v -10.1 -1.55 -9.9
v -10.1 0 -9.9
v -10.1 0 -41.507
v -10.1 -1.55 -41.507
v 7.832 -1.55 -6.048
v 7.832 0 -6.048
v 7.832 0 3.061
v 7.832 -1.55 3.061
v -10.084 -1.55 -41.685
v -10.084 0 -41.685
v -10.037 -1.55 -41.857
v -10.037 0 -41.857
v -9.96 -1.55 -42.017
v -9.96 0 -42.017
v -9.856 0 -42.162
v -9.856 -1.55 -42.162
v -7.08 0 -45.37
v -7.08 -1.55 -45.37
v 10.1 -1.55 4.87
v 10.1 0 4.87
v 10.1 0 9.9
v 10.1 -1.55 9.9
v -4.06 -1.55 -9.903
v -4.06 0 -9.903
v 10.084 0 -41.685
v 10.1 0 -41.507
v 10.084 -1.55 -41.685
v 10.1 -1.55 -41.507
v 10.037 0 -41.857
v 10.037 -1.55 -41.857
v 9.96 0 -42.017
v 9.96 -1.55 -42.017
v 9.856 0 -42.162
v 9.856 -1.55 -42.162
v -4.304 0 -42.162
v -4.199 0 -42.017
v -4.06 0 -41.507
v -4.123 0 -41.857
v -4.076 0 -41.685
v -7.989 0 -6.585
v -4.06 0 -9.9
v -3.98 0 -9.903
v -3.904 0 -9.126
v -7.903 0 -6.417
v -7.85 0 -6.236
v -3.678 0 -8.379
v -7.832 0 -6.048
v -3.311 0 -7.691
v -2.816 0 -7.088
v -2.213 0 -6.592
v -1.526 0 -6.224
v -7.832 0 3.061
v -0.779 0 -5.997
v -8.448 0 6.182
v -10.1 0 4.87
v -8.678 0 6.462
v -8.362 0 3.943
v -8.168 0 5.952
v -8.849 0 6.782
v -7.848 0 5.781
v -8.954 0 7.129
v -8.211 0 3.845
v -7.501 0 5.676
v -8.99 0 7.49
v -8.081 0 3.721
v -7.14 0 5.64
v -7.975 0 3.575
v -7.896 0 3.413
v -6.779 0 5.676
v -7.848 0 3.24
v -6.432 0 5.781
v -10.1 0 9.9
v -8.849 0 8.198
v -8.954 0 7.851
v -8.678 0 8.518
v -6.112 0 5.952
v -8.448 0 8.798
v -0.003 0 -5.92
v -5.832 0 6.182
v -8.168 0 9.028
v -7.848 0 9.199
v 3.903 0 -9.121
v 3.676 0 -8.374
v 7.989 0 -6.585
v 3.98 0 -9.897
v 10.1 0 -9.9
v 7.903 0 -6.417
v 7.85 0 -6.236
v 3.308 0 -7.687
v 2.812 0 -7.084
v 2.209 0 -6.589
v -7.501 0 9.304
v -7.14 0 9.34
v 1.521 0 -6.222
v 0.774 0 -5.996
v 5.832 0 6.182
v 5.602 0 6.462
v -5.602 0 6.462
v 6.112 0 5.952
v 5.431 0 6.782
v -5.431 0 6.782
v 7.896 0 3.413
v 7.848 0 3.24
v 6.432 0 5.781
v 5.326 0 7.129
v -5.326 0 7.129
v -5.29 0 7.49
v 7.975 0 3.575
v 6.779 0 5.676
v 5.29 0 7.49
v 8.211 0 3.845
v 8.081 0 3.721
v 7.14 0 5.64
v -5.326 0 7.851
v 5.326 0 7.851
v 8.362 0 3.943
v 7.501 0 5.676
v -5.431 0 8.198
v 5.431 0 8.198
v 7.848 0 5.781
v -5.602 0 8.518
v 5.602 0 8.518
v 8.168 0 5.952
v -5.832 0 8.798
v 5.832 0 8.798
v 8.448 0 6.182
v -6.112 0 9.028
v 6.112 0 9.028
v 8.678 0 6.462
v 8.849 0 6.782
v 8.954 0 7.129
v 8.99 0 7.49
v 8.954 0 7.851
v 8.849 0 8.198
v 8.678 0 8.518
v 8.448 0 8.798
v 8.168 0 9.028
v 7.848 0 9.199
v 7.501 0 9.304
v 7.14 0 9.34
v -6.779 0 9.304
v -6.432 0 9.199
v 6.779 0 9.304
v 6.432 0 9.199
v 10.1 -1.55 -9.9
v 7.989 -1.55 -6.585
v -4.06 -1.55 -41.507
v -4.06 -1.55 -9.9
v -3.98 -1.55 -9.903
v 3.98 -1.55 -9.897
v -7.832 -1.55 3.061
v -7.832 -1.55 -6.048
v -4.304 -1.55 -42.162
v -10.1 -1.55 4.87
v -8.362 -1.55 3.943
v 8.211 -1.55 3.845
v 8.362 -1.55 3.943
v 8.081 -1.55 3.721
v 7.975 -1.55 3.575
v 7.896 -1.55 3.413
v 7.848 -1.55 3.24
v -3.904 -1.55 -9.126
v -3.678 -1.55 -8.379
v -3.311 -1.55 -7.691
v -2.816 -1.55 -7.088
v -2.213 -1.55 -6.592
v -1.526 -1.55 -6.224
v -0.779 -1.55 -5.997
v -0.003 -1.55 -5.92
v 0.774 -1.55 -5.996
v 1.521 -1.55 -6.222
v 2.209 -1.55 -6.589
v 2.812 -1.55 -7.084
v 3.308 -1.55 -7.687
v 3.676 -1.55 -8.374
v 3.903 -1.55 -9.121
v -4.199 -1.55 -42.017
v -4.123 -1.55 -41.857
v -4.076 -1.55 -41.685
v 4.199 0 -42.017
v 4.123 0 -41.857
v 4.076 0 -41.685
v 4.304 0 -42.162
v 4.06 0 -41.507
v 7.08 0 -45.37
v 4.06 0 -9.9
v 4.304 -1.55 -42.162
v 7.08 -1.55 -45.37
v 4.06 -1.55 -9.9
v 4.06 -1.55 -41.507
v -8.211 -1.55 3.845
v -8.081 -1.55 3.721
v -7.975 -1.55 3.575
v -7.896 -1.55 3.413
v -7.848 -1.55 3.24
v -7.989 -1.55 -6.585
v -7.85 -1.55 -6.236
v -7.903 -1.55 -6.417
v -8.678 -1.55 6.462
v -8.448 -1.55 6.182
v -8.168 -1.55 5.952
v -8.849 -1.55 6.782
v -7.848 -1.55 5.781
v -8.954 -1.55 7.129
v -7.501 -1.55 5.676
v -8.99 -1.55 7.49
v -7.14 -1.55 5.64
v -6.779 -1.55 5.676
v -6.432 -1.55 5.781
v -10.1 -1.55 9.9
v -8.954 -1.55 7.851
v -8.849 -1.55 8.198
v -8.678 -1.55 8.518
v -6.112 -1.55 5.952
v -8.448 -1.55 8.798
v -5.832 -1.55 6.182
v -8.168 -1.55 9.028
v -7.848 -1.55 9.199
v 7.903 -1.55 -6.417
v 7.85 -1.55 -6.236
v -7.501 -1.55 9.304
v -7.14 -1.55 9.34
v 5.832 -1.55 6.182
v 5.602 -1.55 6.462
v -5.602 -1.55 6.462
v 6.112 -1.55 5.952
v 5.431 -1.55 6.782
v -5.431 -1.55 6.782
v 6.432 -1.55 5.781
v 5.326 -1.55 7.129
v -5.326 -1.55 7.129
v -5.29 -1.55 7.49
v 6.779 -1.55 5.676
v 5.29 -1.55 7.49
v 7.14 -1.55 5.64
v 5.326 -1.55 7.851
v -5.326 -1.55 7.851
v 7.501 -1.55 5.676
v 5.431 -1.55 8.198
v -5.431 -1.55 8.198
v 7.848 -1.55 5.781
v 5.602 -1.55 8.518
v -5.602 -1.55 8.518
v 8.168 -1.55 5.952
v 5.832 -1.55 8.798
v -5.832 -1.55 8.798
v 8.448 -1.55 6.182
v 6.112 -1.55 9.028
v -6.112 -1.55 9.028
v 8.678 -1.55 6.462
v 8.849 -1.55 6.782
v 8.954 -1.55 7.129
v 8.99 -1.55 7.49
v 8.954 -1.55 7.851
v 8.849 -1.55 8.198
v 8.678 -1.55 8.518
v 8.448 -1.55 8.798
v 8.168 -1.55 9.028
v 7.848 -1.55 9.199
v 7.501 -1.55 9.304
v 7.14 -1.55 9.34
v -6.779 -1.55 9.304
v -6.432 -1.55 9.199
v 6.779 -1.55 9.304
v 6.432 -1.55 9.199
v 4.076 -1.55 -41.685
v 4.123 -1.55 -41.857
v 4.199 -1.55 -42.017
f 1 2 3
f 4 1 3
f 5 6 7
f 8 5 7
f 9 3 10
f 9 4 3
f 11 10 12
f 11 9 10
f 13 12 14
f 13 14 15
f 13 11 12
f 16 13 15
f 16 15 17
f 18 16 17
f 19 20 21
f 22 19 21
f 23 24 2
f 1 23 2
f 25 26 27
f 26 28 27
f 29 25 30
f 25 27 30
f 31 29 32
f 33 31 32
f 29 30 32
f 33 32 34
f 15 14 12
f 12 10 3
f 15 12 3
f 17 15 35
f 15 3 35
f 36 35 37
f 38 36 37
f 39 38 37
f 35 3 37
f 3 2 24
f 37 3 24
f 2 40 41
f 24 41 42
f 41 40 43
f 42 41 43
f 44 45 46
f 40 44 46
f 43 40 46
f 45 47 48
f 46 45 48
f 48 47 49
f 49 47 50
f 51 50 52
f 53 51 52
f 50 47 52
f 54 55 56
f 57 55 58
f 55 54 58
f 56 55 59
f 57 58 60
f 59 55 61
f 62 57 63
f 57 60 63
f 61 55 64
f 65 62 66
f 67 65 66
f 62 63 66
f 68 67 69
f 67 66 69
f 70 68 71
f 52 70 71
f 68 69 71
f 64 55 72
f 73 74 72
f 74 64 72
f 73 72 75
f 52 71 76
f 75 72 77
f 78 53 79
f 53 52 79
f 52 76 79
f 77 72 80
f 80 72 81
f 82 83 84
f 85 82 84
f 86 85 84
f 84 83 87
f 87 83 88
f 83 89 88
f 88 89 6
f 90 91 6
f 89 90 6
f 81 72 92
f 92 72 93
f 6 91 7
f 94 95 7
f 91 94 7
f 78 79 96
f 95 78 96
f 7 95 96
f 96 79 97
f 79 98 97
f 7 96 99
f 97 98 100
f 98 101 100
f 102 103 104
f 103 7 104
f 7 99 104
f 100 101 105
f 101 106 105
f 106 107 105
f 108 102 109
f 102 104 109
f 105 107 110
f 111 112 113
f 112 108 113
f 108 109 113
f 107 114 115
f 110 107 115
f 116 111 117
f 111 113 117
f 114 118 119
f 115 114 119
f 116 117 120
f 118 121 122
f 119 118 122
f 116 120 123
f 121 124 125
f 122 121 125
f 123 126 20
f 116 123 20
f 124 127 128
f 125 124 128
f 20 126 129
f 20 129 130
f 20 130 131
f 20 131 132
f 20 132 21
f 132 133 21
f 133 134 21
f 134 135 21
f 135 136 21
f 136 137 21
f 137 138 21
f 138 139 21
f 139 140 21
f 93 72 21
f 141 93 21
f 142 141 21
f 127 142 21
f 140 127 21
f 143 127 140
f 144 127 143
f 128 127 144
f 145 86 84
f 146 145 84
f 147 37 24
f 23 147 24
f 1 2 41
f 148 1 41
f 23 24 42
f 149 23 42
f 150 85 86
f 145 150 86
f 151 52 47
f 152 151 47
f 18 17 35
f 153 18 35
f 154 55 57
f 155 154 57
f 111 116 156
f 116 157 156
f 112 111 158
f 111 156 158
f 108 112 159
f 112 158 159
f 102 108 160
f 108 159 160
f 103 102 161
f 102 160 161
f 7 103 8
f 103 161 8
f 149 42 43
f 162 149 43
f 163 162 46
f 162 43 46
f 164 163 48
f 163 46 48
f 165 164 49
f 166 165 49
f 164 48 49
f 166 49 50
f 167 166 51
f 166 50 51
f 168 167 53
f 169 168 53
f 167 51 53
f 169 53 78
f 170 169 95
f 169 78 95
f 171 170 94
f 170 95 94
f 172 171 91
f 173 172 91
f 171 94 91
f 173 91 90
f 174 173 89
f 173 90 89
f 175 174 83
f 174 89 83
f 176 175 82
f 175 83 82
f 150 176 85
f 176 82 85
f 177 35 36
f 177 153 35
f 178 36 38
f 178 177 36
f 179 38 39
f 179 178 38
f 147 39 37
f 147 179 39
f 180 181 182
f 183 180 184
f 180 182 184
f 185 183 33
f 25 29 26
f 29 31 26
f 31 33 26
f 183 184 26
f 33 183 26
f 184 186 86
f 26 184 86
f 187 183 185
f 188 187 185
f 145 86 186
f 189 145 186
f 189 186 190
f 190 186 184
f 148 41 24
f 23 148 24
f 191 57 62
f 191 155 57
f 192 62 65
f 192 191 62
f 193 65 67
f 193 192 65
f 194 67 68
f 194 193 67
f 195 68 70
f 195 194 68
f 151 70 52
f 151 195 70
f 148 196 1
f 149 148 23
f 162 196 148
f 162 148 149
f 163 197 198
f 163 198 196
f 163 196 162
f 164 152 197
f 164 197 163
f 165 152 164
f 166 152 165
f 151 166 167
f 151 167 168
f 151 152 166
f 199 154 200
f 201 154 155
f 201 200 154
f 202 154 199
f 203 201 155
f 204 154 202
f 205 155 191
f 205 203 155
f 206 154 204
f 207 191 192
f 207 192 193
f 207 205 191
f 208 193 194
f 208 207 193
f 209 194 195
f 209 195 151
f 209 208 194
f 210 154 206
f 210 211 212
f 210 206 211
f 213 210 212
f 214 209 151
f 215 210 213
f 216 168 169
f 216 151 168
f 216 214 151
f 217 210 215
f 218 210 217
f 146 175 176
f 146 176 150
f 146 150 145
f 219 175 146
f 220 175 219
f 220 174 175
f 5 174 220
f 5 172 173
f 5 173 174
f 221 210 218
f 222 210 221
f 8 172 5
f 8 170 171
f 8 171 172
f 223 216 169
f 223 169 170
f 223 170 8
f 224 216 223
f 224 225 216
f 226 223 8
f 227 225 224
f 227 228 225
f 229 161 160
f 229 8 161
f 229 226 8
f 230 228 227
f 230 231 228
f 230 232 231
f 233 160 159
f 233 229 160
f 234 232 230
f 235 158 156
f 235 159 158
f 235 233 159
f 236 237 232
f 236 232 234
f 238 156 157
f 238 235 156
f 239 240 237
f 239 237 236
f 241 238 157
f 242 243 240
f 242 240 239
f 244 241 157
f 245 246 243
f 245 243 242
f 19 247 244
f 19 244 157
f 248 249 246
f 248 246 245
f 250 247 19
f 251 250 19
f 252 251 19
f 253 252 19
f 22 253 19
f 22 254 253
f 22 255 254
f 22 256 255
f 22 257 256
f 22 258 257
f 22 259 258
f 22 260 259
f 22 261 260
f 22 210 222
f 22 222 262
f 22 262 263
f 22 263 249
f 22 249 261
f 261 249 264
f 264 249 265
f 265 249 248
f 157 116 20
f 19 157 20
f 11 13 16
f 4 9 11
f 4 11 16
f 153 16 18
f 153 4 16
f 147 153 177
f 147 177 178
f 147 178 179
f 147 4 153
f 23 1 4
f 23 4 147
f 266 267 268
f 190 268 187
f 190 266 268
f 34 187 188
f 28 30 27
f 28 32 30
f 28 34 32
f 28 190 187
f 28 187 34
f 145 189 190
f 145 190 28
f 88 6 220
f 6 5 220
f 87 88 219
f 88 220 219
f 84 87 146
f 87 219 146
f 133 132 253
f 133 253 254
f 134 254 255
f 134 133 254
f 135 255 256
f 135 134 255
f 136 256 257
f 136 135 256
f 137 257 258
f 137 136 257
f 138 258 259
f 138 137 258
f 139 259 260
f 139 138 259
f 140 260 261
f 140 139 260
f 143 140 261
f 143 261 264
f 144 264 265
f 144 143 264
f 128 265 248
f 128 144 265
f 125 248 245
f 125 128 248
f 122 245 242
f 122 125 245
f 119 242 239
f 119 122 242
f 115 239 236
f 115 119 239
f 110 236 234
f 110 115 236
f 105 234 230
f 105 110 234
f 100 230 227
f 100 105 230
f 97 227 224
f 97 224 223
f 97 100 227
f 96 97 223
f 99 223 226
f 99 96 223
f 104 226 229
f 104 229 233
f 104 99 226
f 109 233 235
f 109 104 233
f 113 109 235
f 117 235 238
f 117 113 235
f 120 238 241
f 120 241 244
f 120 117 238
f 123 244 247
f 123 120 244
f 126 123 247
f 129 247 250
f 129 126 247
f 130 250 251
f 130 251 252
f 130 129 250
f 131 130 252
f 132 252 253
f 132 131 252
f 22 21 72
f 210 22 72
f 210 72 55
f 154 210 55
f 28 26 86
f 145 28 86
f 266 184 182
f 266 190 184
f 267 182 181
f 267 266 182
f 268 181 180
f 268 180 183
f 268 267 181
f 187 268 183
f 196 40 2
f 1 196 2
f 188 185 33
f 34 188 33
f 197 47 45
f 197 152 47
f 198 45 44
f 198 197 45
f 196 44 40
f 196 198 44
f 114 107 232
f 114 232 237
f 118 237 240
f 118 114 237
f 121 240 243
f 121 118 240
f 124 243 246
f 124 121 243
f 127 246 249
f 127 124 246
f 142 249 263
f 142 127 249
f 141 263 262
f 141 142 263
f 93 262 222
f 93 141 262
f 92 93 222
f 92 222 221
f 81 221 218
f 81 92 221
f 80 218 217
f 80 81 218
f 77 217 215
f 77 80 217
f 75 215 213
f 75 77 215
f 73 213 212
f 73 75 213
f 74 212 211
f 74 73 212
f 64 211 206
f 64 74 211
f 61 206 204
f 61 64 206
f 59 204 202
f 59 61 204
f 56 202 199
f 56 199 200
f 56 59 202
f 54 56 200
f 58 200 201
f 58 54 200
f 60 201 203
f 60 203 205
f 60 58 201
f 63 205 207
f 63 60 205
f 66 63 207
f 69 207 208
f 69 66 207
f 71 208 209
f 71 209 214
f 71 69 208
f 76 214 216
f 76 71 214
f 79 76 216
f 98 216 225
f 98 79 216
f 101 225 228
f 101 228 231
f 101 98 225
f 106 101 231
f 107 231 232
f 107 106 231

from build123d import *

# Parameters (mm, degrees)
F1_DEPTH = 1.55
F0_R     = 1.85
F2_R     = 1
F2_2_R   = 1
F2_3_R   = 1


# Not quite as in the source:
# - ends of sketch curves that miss each other by under 0.0002 mm in the source are joined


with BuildPart() as f1:
    # F0 (on Front) → F1 (new body)
    with BuildSketch(Plane.XZ):
        Polygon((-4.0597100742, -9.902607639), (-10.1, -9.9000012899), (-10.1, -41.8800012899), (-7.0798584417, -45.3703802887), (-4.0597100742, -41.8800014933), align=None)
    extrude(amount=F1_DEPTH)

    # F2#2
    f2_2_edges = [f1.edges().sort_by_distance(p)[0] for p in [
        (-10.1, -0.775, -41.880001),
        (-4.05971, -0.775, -41.880001),
    ]]
    fillet(f2_2_edges, radius=F2_2_R)


with BuildPart() as f1b:
    # F0 (on Front) → F1, piece 2 (new body)
    with BuildSketch(Plane.XZ):
        Polygon((10.1, -41.8800012899), (10.1, -9.9000012899), (4.0597100742, -9.902607639), (4.0597100742, -41.8800014933), (7.0798584417, -45.3703802887), align=None)
        Polygon((4.0597100742, -9.902607639), (10.1, -9.9000012899), (4.0597100742, -9.9000005185), align=None)
    extrude(amount=F1_DEPTH)

    # F2#3
    f2_3_edges = [f1b.edges().sort_by_distance(p)[0] for p in [
        (4.05971, -0.775, -41.880001),
        (10.1, -0.775, -41.880001),
    ]]
    fillet(f2_3_edges, radius=F2_3_R)


with BuildPart() as f1c:
    # F0 (on Front) → F1, piece 3 (new body)
    with BuildSketch(Plane.XZ):
        with BuildLine():
            Line((10.1, 9.9000012899), (-10.1, 9.899998069))
            Line((-10.1, 9.899998069), (-10.099999198, 4.869998069))
            Line((-10.099999198, 4.869998069), (-7.8321473486, 3.6609703649))
            Line((-7.8321473486, 3.6609703649), (-7.8321473486, -6.3390296351))
            Line((-7.8321473486, -6.3390296351), (-10.1, -9.9000012899))
            Line((-10.1, -9.9000012899), (-4.0597100742, -9.9000005185))
            Line((-4.0597100742, -9.9000005185), (-4.0597100742, -9.902607639))
            Line((-4.0597100742, -9.902607639), (-3.9800005697, -9.9026420332))
            ThreePointArc((-3.9800005697, -9.9026420332), (-0.0026423538, -5.9199991097), (3.9800005697, -9.8973573257))
            Line((3.9800005697, -9.8973573257), (10.1, -9.899998069))
            Line((10.1, -9.899998069), (7.8321473486, -6.3390296351))
            Line((7.8321473486, -6.3390296351), (7.8321473486, 3.6609703649))
            Line((7.8321473486, 3.6609703649), (10.099999198, 4.869998069))
            Line((10.099999198, 4.869998069), (10.1, 9.9000012899))
        make_face()
        with Locations((-7.1400015305, 7.489998541)):
            Circle(F0_R, mode=Mode.SUBTRACT)
        with Locations((7.1400015305, 7.489998541)):
            Circle(F0_R, mode=Mode.SUBTRACT)
    extrude(amount=F1_DEPTH)

    # F2
    f2_edges = [f1c.edges().sort_by_distance(p)[0] for p in [
        (7.832147, -0.775, 3.66097),
        (7.832147, -0.775, -6.33903),
        (-7.832147, -0.775, 3.66097),
        (-7.832147, -0.775, -6.33903),
    ]]
    fillet(f2_edges, radius=F2_R)


solid = Compound([f1.part, f1b.part, f1c.part])
